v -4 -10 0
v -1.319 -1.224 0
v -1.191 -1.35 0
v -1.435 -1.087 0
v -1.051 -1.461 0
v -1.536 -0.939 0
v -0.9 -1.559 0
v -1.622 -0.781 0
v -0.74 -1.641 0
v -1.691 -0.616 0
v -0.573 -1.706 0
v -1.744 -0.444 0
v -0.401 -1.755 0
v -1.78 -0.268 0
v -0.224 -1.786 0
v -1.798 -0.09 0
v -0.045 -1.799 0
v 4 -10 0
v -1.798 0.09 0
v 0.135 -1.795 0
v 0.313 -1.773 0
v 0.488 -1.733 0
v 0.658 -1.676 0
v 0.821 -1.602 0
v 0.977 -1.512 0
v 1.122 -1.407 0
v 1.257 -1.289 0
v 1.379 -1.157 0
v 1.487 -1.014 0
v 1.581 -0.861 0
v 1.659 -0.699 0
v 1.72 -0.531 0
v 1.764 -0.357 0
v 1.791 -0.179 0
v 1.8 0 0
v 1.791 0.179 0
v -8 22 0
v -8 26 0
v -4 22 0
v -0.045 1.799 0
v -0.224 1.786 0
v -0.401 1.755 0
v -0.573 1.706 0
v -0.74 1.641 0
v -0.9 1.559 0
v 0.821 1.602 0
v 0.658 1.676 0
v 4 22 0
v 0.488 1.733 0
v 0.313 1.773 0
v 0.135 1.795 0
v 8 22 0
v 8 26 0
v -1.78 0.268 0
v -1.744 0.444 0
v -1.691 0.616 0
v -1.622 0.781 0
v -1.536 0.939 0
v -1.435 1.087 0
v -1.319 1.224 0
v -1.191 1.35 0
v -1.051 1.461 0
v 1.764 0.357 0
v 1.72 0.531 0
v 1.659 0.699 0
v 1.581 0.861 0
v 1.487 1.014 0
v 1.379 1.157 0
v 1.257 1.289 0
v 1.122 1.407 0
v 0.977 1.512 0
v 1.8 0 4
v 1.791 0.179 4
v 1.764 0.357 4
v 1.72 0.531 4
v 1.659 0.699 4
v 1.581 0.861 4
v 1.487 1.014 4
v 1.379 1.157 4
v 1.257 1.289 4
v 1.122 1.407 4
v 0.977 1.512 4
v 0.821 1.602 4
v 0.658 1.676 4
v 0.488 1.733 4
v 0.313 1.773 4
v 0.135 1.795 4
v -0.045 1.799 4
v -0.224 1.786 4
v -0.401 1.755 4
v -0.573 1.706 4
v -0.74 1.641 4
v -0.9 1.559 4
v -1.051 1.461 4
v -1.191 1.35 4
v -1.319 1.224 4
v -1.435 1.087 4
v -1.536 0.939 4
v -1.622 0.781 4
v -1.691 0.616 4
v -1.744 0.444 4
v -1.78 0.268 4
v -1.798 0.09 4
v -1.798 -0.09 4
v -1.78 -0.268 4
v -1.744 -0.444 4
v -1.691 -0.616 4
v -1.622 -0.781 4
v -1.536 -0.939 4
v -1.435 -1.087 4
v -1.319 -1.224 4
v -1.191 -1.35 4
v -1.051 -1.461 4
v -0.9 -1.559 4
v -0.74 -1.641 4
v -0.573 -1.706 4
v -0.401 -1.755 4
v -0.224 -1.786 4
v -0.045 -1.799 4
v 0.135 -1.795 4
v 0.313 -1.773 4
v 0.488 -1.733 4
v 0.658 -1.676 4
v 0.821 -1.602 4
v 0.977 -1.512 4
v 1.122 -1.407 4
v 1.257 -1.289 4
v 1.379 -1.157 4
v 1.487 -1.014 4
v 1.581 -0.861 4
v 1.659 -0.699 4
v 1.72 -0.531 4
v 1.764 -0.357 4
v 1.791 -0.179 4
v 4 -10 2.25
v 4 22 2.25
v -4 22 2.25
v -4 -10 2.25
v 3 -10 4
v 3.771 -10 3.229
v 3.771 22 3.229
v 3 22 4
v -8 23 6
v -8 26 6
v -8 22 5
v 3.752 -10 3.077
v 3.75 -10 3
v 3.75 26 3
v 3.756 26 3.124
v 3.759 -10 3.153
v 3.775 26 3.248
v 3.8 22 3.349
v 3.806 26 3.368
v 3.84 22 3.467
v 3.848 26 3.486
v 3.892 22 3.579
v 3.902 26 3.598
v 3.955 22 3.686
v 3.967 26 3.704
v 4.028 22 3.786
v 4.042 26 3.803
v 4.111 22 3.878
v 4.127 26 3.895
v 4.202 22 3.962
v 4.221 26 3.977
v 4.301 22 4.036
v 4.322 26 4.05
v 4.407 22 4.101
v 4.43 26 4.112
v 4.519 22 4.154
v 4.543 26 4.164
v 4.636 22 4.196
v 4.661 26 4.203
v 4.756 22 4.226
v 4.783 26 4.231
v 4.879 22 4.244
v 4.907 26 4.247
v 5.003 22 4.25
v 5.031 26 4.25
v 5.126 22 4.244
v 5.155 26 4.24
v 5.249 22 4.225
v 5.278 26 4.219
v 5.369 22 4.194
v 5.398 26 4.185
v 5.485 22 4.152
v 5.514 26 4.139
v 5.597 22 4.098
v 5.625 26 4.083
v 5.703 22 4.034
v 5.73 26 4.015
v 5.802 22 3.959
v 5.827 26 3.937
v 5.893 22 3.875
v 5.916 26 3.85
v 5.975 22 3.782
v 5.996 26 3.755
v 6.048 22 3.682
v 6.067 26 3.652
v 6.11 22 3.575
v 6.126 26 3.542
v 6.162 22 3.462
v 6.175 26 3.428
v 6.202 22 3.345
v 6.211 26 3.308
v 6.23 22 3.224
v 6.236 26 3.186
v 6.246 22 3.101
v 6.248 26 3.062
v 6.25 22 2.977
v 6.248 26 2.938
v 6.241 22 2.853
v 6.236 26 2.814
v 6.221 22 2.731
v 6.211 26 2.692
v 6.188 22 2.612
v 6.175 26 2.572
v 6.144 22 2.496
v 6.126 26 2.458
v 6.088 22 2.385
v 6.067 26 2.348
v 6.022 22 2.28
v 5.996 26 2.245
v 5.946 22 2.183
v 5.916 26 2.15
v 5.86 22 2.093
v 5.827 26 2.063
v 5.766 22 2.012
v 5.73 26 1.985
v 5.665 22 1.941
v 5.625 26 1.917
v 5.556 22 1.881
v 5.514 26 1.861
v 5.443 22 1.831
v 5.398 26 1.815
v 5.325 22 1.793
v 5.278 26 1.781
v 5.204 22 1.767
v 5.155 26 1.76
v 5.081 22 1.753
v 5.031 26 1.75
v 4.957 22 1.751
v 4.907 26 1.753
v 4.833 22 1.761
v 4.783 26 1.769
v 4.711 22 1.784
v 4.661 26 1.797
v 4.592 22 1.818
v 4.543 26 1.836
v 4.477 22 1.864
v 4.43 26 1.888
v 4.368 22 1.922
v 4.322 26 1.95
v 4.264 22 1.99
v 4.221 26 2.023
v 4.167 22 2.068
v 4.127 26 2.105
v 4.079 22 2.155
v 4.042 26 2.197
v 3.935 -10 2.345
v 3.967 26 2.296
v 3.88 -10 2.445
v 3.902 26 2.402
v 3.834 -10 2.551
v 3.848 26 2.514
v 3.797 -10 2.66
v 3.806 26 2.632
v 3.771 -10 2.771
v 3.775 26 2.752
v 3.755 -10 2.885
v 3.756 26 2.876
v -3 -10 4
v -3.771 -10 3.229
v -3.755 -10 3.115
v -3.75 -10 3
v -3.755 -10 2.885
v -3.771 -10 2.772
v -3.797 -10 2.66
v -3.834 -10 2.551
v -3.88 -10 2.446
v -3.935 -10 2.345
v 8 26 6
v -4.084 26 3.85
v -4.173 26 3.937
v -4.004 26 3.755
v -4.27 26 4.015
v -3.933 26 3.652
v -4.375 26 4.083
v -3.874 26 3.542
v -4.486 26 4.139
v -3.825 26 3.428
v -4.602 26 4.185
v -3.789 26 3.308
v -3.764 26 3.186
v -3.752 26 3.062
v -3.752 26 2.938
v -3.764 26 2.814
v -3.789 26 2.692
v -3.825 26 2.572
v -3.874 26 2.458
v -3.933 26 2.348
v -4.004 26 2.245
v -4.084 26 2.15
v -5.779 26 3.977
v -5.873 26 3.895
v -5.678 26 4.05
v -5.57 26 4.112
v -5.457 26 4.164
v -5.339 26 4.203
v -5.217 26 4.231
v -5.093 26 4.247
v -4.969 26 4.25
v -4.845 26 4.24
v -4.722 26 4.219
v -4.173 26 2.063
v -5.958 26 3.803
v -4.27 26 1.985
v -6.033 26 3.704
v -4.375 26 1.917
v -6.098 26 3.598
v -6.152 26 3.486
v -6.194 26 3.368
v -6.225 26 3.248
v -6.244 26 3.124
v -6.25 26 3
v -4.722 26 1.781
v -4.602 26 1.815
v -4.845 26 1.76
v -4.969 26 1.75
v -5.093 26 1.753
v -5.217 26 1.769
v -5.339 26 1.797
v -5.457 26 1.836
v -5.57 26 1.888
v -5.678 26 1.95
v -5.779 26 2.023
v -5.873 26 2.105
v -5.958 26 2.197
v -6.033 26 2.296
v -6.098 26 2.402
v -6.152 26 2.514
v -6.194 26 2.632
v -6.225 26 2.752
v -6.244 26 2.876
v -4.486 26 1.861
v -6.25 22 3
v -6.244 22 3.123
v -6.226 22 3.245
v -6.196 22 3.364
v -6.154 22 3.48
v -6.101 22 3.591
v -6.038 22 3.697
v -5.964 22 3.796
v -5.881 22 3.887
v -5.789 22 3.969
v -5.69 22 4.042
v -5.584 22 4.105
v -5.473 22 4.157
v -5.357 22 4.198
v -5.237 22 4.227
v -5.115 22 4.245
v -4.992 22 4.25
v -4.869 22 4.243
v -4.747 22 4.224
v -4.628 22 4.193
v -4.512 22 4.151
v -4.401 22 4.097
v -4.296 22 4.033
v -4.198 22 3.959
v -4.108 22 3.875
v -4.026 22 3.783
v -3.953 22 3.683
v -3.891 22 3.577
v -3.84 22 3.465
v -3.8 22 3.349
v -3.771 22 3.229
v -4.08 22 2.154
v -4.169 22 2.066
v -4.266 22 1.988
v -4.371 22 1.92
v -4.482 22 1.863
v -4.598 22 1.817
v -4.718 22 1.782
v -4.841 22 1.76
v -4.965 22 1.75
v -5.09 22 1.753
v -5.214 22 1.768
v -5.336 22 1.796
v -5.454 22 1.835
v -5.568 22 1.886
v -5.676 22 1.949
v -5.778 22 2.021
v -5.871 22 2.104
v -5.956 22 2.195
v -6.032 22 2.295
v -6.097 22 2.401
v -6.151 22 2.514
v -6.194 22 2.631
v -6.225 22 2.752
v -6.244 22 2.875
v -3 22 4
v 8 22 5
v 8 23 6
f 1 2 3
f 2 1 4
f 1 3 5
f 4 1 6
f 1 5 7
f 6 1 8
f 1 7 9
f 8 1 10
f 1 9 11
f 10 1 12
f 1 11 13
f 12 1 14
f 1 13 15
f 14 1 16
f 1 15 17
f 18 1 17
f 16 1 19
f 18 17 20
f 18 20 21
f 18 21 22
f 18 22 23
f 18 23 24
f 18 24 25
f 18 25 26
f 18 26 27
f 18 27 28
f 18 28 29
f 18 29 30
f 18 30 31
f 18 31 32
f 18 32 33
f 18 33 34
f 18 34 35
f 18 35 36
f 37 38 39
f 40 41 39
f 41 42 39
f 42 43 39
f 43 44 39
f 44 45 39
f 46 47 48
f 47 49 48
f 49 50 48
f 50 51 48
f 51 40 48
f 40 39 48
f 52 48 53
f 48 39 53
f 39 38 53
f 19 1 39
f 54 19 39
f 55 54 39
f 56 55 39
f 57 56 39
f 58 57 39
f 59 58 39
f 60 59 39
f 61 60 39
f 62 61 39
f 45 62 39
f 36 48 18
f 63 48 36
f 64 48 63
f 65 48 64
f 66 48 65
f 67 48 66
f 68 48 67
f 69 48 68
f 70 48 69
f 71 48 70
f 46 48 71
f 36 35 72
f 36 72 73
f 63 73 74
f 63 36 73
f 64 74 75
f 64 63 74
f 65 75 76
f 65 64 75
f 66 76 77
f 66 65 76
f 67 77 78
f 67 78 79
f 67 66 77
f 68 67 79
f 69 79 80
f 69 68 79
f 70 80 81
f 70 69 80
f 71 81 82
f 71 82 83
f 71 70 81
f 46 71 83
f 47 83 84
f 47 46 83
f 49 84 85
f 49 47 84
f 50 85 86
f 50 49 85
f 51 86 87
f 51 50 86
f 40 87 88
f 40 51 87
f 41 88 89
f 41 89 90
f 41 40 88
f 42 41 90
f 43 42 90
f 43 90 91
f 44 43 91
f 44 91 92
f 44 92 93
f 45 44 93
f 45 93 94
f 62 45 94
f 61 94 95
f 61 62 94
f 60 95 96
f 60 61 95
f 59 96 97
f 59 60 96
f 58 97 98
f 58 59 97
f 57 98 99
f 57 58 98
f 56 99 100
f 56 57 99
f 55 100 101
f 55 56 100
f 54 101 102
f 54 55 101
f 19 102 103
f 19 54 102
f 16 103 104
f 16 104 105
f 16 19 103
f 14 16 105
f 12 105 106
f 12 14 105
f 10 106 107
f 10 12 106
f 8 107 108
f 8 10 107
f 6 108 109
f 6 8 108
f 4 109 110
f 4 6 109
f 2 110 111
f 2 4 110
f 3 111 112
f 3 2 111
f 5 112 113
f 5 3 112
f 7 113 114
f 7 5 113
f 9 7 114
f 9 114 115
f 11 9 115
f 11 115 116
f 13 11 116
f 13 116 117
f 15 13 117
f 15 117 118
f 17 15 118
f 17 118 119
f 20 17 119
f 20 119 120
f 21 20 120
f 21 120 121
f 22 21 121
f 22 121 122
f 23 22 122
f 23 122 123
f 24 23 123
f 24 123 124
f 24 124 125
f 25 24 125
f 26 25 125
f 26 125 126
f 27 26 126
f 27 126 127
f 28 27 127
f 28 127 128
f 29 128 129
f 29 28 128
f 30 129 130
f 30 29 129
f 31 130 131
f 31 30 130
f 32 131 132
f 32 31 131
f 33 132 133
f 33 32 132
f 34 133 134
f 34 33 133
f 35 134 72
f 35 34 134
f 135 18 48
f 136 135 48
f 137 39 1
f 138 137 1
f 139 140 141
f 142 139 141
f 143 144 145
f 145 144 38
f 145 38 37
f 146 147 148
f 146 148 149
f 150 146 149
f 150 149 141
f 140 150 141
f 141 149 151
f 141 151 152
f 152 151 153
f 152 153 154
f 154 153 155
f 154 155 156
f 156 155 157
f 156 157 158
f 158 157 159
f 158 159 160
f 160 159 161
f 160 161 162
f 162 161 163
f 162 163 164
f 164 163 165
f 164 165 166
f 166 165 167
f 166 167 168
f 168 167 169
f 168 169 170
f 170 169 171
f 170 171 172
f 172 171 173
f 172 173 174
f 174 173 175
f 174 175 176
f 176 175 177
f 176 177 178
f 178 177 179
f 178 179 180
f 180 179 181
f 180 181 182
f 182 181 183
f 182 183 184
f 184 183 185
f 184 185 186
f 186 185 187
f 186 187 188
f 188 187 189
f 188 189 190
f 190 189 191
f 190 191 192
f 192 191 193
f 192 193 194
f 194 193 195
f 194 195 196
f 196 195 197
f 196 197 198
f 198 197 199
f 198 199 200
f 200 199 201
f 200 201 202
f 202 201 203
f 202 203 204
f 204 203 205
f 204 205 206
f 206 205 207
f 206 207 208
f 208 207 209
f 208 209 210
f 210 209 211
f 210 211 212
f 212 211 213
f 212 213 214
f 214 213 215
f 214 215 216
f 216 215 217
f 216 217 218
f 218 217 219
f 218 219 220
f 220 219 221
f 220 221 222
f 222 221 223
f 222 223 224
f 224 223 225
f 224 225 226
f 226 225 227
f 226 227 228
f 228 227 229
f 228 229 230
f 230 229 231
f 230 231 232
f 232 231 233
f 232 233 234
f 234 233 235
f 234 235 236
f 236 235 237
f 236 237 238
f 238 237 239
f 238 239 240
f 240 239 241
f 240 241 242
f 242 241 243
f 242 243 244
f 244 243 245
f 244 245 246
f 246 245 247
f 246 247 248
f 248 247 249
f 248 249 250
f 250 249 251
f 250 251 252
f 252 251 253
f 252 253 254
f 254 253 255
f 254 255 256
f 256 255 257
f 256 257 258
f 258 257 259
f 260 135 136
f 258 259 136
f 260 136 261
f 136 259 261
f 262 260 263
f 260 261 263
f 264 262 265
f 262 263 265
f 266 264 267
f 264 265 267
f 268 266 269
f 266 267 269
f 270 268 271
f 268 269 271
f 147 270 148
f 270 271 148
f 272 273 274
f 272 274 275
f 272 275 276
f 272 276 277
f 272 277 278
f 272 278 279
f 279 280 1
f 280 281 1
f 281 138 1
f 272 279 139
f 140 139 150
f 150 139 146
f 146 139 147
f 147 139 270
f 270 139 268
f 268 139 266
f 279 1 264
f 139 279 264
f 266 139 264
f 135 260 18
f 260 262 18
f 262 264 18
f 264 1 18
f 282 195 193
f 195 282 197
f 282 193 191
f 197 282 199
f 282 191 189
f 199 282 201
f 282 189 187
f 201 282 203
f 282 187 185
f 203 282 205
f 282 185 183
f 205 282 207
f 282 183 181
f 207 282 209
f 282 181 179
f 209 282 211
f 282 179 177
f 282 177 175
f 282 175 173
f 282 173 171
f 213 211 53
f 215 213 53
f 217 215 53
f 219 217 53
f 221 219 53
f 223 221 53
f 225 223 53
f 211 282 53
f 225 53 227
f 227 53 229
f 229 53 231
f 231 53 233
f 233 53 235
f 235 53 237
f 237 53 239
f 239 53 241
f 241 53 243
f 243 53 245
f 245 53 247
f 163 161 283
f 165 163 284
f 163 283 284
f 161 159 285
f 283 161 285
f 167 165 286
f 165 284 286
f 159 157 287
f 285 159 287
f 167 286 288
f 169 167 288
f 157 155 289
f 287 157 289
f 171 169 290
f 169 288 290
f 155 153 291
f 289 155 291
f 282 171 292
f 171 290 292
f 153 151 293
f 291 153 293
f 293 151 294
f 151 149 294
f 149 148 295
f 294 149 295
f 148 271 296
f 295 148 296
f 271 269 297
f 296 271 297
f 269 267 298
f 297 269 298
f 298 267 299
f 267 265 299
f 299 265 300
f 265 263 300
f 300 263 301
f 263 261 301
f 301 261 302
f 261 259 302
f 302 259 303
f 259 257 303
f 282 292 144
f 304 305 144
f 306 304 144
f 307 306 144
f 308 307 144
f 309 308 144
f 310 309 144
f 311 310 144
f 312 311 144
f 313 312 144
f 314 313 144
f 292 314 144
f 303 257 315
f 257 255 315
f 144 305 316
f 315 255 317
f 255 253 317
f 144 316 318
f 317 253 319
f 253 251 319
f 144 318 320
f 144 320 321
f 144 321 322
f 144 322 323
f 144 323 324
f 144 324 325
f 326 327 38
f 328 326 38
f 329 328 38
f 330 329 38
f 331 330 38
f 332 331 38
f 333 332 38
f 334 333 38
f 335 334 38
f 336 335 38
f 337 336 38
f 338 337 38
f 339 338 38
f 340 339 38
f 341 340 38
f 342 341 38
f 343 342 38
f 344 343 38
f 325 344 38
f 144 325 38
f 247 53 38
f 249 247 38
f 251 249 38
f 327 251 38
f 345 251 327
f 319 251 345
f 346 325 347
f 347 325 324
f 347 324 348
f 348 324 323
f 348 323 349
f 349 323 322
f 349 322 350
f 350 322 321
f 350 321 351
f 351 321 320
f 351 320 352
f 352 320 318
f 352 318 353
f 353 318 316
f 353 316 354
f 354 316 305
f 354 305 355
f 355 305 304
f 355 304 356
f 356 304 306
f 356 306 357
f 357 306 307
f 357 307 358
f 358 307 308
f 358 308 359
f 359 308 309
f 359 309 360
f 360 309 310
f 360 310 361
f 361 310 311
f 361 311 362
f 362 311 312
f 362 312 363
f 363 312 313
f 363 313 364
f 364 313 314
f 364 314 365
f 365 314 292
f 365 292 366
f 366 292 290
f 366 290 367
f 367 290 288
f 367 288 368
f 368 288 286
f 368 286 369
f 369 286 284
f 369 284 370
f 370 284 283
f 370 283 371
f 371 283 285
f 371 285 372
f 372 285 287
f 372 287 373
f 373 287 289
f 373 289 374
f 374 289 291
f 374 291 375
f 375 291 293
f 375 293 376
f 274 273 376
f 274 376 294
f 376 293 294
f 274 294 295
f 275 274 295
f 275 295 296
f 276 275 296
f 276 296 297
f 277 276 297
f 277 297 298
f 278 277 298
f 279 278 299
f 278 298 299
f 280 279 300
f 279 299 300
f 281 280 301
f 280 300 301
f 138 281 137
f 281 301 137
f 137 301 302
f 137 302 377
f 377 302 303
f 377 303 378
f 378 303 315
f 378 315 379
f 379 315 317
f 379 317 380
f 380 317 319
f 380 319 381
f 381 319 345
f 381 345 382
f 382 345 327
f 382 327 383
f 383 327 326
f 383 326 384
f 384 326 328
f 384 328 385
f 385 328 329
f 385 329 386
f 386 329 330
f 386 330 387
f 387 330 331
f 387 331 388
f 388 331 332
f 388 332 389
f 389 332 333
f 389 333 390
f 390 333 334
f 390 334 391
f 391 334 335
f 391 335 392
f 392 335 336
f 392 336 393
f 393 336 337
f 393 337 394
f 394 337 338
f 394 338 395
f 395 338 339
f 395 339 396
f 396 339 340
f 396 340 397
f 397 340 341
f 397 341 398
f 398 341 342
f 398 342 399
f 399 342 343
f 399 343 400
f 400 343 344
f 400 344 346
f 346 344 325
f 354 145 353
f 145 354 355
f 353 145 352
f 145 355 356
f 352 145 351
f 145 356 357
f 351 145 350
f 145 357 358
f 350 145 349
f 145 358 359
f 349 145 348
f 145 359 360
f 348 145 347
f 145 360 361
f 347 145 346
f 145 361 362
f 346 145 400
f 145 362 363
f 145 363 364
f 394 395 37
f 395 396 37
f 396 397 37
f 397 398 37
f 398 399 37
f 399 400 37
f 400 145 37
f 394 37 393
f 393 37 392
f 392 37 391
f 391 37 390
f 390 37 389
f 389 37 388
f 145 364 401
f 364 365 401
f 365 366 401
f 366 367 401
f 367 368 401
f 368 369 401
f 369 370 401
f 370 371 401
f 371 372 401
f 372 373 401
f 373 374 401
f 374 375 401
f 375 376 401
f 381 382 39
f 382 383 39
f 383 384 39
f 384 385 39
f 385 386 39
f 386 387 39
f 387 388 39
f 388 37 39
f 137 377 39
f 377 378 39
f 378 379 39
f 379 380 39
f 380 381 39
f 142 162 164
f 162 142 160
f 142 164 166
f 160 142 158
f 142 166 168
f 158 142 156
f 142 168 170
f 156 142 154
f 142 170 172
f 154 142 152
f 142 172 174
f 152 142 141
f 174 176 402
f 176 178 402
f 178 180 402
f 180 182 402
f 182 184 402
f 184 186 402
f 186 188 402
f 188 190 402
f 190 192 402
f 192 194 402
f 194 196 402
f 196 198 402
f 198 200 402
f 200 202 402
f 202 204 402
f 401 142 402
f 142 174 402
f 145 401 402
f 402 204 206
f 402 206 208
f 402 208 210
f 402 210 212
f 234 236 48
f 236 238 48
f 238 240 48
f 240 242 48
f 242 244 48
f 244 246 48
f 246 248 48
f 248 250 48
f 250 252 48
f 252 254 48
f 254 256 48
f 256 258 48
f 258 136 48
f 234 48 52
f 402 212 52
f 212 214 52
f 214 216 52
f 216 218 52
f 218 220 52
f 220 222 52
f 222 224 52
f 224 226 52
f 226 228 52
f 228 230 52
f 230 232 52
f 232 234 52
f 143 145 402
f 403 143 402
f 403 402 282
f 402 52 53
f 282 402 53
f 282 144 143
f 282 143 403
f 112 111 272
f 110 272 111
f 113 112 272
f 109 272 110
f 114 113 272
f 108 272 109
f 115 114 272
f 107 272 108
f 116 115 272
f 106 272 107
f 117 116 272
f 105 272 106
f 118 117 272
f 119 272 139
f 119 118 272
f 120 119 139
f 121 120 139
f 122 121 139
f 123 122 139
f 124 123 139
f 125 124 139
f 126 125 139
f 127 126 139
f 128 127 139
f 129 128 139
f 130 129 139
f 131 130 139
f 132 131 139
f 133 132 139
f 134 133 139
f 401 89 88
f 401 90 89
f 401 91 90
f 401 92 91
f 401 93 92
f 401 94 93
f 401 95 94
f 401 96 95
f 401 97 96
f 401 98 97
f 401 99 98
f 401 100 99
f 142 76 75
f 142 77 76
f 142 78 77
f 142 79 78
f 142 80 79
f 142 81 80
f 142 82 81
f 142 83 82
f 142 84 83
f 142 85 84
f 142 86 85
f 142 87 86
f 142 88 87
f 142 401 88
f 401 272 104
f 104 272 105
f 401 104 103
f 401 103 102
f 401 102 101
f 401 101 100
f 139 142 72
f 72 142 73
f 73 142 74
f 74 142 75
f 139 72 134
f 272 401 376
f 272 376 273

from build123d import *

# Parameters (mm, degrees)
F0_R     = 1.8
F1_DEPTH = 4
F2_DEPTH = 6
F4_SIZE  = 1
F3_R     = 1.25
F5_DEPTH = 40


with BuildPart() as f1:
    # F0 (on Top) → F1 (new body)
    with BuildSketch(Plane.XY):
        Polygon((4, 22), (-4, 22), (-4, -10), (0, -10), (4, -10), align=None)
        Circle(F0_R, mode=Mode.SUBTRACT)
    extrude(amount=F1_DEPTH)

    # F0 (on Top) → F2 (join)
    with BuildSketch(Plane.XY):
        Polygon((8, 26), (0, 26), (-8, 26), (-8, 22), (-4, 22), (4, 22), (8, 22), align=None)
    extrude(amount=F2_DEPTH)

    # F4
    f4_edges = [f1.edges().sort_by_distance(p)[0] for p in [
        (0, 22, 6),
        (-4, 6, 4),
        (4, 6, 4),
    ]]
    chamfer(f4_edges, length=F4_SIZE)

    # F3 (on face) → F5 (cut)
    with BuildSketch(Plane(origin=(0, 26, 0), x_dir=(-1, 0, 0), z_dir=(0, 1, 0))):
        with Locations((-5, 3)):
            Circle(F3_R)
        with Locations((5, 3)):
            Circle(F3_R)
    extrude(amount=-F5_DEPTH, mode=Mode.SUBTRACT)


solid = f1.part
